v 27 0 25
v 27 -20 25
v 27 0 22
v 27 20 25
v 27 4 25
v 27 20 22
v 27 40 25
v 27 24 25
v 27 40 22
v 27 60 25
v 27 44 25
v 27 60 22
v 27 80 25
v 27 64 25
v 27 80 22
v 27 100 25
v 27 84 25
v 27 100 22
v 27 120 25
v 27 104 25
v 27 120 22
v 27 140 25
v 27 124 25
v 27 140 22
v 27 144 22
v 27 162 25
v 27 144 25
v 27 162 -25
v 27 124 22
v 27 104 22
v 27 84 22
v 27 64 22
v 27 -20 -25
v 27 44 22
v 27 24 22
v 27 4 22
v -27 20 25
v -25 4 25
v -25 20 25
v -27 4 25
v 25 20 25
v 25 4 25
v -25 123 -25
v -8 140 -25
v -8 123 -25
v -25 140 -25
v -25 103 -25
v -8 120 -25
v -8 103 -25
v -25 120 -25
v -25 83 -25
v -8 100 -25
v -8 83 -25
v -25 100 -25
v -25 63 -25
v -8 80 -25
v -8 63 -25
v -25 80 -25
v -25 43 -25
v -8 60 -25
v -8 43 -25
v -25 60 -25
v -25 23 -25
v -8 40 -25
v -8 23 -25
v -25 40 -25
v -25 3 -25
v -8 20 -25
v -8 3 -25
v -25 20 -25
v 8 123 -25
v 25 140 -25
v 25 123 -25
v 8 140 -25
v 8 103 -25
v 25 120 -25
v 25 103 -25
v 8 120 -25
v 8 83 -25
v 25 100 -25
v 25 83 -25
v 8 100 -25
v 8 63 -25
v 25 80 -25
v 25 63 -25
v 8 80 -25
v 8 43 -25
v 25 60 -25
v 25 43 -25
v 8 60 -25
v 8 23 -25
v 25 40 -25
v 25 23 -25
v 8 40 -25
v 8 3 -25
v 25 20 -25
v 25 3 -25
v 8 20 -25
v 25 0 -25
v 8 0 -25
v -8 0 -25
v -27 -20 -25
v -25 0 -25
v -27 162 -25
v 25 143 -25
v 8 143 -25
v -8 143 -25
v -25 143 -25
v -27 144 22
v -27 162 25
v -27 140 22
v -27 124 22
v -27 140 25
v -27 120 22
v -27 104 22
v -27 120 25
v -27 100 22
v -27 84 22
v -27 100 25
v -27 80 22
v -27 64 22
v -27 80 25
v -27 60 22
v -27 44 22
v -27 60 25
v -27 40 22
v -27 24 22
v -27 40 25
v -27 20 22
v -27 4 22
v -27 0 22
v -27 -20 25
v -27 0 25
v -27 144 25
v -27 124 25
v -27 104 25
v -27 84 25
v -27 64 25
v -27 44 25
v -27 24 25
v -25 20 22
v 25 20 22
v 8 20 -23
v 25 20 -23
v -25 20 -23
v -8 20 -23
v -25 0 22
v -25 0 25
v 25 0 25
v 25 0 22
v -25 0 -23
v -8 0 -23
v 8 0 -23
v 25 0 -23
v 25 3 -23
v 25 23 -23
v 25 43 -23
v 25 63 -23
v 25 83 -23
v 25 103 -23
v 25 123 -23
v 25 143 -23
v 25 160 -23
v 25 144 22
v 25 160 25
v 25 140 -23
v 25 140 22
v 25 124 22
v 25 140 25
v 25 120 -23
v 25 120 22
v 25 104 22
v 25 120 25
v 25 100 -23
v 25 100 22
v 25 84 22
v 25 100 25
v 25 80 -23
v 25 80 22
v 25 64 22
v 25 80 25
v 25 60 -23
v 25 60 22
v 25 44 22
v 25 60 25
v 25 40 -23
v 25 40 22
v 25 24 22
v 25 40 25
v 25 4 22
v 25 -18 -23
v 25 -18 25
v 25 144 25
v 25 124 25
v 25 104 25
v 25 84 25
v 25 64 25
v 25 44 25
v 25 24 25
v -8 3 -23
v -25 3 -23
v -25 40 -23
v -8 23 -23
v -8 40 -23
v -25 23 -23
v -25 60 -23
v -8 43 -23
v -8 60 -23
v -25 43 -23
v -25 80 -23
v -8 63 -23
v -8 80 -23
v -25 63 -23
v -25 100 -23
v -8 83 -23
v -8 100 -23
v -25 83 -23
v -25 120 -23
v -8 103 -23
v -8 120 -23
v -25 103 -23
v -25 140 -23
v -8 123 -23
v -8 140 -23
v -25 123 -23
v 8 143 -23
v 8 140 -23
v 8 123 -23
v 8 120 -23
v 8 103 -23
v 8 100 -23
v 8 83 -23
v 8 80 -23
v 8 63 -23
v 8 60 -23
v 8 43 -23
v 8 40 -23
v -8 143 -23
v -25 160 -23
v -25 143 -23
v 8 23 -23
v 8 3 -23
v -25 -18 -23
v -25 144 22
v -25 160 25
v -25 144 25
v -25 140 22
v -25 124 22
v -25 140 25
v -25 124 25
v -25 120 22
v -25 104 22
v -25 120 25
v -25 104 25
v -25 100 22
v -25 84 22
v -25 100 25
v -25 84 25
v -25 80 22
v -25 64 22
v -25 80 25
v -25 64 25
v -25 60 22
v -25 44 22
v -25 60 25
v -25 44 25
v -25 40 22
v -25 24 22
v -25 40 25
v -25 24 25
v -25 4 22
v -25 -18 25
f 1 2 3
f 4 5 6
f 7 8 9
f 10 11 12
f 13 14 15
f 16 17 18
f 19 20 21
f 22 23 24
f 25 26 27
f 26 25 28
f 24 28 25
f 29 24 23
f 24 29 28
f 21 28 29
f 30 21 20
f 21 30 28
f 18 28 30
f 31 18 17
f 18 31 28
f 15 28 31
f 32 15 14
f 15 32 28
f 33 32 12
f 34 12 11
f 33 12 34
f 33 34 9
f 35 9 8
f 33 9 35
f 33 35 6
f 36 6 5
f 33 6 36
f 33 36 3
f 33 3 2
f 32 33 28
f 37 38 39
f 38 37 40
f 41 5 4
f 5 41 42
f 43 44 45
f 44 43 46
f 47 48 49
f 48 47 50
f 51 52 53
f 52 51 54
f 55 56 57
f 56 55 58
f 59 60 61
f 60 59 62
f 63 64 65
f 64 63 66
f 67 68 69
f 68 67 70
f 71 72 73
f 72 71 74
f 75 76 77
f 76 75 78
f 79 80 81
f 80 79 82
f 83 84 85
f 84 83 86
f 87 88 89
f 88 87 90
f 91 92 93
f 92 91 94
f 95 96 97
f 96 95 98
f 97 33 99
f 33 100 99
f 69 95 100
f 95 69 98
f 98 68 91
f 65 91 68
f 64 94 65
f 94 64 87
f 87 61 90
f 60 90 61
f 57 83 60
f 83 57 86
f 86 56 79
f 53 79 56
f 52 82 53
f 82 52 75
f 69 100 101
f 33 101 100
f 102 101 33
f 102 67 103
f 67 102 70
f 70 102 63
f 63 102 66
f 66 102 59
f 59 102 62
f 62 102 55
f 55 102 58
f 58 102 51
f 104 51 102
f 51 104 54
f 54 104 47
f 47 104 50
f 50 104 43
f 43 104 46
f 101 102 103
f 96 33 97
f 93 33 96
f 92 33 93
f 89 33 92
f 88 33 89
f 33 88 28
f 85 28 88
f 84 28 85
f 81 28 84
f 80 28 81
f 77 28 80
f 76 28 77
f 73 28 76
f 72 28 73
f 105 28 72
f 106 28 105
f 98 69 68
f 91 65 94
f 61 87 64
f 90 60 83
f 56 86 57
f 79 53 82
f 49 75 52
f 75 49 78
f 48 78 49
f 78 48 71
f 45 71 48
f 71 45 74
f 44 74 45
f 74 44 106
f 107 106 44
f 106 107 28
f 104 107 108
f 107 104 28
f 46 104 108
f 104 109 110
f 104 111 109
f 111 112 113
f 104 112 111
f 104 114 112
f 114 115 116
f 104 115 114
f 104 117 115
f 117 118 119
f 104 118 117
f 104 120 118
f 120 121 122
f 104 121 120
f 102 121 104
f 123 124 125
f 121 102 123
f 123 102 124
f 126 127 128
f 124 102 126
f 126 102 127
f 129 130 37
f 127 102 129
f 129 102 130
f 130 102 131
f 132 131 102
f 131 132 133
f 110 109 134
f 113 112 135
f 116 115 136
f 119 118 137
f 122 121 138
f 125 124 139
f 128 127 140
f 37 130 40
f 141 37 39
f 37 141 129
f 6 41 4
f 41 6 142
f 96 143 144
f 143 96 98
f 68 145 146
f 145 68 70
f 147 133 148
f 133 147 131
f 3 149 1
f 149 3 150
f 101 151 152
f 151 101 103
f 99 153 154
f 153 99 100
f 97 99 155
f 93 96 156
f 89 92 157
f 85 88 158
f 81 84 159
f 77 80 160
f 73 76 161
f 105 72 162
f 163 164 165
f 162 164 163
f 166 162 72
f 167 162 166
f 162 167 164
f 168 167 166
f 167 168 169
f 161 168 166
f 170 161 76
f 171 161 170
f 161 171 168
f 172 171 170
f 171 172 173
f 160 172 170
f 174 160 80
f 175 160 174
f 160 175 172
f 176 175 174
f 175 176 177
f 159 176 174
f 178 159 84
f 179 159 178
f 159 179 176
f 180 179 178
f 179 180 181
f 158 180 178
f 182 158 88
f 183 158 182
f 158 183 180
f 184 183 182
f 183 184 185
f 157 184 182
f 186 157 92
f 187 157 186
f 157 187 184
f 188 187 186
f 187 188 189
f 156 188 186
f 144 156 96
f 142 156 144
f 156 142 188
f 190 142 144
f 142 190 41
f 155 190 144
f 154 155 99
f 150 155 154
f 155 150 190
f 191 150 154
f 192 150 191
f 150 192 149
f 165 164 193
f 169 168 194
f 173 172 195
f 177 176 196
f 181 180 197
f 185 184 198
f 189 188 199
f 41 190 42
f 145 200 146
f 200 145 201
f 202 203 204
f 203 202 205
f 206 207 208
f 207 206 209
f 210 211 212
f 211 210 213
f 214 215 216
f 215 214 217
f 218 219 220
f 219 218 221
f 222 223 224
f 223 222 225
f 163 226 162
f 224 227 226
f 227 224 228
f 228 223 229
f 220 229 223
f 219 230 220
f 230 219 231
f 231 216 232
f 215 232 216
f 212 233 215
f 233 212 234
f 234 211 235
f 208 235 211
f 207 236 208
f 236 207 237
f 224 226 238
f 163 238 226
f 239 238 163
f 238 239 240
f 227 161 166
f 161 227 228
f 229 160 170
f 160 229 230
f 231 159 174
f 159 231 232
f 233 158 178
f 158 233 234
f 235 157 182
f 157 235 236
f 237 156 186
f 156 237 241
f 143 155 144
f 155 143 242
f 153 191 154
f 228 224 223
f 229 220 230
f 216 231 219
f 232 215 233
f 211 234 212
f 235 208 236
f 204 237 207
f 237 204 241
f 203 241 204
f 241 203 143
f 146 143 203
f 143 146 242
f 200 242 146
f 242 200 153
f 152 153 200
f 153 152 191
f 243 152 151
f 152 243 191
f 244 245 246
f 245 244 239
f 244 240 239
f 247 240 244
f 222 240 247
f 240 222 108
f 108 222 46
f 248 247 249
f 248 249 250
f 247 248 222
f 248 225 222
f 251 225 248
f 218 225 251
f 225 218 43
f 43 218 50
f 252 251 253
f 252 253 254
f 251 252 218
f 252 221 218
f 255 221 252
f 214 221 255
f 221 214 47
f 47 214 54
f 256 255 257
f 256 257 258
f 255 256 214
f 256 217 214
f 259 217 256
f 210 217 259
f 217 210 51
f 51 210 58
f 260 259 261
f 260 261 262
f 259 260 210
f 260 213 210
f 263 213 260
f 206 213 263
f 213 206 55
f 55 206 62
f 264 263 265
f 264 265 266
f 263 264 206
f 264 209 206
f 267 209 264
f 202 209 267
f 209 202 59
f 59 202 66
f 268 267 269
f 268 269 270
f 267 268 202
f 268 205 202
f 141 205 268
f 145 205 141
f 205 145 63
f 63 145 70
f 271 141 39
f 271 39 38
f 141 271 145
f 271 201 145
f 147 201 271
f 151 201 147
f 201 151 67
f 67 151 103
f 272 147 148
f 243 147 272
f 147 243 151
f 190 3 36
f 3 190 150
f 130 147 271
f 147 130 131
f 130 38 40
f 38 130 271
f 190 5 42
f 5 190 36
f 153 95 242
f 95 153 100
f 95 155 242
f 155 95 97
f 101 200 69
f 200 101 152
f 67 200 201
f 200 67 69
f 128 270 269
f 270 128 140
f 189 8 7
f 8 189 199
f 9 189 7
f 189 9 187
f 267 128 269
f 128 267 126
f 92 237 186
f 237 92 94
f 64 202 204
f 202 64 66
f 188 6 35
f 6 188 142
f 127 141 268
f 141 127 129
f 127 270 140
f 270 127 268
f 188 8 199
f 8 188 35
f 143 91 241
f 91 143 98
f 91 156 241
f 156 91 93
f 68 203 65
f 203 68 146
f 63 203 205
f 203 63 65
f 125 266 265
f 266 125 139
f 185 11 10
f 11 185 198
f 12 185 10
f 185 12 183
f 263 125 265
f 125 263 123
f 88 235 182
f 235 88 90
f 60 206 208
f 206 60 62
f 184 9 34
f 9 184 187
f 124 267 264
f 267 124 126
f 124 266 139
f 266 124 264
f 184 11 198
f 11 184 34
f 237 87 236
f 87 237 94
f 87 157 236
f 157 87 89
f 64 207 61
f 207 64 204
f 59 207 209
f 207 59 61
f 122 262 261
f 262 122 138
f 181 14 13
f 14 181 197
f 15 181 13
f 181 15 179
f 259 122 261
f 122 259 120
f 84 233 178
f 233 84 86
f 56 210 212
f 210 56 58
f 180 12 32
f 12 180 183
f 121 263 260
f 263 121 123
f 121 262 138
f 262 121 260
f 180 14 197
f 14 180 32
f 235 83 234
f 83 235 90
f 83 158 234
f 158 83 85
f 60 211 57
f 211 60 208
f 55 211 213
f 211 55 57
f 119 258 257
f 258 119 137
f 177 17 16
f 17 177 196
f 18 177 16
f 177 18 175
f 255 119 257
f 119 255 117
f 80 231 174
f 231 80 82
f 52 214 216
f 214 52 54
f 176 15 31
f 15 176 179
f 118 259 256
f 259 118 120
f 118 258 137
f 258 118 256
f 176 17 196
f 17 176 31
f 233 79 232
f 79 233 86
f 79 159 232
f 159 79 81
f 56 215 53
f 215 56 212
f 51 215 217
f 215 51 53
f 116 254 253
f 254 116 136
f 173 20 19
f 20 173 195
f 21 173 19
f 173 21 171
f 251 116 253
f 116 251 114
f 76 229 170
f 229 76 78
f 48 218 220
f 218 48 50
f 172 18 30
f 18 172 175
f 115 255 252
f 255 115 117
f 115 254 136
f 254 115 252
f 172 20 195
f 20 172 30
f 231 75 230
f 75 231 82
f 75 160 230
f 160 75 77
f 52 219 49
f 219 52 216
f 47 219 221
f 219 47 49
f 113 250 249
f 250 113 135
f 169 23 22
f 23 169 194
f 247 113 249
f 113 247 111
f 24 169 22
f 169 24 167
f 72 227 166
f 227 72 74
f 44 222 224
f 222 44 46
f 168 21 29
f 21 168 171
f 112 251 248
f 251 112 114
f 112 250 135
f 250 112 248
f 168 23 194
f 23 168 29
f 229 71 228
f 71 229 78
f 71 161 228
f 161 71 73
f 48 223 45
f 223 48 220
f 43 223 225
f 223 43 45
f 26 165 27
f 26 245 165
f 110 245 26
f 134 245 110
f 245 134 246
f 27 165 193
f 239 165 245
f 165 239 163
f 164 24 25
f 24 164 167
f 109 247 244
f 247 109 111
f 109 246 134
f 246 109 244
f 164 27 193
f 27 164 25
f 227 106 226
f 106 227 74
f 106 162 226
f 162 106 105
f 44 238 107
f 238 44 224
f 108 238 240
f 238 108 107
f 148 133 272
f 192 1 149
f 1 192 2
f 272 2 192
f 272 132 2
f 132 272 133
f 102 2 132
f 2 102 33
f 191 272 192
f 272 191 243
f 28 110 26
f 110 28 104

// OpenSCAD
width = 54;
height = 50;
wall_thickness = 2;
num_sec = 9;

num_middle=num_sec-1;


module start(){
    difference(){
        translate([0,-10,0])cube([width, 20, height], center=true);
        translate([0,wall_thickness-10, wall_thickness]) 
        cube([width-2*  wall_thickness, 20, height], center=true);
    }
}

module end(){
translate([0,wall_thickness/2, 0])cube([width, wall_thickness, height], center=true);
}

module front_back(){
union(){
start();
translate([0, (num_sec-1)*20, 0])end();
}
}

module middle(){
difference(){
translate([0,10,0])cube([width, 20, height], center=true);
translate([0,10,wall_thickness])cube([width-2*wall_thickness, 20, height], center=true);
translate([0, 2, height/2-1.5])cube([width, 4, 3], center=true);
translate([(width/2)-(((width/2)-wall_thickness-8)/2)-wall_thickness, 1.5, -height/2+wall_thickness/2])cube([(width/2)-wall_thickness-8, 3, wall_thickness], center=true);
translate([-((width/2)-(((width/2)-wall_thickness-8)/2)-wall_thickness), 1.5, -height/2+wall_thickness/2])cube([(width/2)-wall_thickness-8, 3, wall_thickness], center=true);
    }
}

module make(){
    union(){
        for(i = [0:num_middle-1]) {
            translate([0,i*20,0])middle();
        }
        front_back();
    }
}

make();
